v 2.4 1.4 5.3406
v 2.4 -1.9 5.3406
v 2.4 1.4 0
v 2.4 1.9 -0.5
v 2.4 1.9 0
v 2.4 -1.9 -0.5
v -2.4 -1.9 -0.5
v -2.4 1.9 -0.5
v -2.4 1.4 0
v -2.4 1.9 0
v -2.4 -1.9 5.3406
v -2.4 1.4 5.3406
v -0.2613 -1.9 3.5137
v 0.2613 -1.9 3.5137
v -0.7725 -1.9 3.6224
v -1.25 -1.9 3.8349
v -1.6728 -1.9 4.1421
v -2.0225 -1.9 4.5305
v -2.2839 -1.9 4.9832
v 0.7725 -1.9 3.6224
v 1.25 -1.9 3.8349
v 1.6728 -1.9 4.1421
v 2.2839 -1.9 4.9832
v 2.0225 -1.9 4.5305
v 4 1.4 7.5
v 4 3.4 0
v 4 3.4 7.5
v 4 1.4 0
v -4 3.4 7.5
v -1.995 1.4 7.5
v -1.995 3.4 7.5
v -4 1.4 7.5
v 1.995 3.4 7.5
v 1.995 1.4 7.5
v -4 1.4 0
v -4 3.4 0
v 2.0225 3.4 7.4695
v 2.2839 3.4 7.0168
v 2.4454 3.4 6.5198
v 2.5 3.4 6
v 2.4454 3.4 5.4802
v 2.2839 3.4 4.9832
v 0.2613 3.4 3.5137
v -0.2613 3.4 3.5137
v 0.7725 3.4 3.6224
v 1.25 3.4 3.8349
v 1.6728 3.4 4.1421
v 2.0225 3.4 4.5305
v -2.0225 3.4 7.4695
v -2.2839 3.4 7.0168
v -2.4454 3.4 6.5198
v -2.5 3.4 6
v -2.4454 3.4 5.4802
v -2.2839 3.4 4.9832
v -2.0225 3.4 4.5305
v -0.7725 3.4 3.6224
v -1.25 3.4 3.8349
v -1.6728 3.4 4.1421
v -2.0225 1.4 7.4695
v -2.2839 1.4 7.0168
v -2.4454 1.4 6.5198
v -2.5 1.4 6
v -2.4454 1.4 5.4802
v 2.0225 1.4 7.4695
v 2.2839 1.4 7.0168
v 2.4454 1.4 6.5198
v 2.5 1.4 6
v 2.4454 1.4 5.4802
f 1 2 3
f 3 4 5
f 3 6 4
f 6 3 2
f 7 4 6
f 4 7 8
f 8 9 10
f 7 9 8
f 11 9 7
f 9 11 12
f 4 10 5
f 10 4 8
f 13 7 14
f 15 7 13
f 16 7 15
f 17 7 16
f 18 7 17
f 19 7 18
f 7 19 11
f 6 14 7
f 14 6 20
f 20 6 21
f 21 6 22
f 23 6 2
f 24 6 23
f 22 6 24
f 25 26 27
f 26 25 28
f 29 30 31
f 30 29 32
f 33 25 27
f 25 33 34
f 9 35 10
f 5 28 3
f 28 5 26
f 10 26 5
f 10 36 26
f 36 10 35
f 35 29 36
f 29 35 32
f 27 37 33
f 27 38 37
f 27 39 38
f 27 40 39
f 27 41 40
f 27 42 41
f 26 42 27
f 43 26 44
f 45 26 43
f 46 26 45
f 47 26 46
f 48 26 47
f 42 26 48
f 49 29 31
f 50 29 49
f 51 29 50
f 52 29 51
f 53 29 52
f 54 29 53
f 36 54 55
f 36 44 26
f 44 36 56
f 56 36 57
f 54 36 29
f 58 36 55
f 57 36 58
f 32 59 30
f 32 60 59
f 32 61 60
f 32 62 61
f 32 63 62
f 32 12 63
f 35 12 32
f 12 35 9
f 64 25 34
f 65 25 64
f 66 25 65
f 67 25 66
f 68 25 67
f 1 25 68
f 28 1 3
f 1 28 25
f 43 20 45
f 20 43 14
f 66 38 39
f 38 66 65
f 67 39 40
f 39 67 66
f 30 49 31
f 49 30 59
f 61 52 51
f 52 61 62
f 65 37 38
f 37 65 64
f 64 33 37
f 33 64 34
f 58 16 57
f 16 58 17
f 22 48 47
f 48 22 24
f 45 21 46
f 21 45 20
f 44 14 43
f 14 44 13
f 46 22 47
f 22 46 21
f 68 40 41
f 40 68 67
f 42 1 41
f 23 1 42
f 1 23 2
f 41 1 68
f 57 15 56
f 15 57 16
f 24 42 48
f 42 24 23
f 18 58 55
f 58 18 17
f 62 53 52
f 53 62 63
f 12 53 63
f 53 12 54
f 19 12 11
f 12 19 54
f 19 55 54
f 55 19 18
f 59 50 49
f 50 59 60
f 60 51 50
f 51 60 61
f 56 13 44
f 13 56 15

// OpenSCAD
difference () {
  union () {
    translate ([0.000, 0.000, 3.000]) {
      cube (size = [ 4.800, 3.800, 7.000], center = true);
    }
    translate ([0.000, 2.400, 0.000]) {
      translate ([0.000, 0.000, 3.750]) {
        cube (size = [ 8.000, 2.000, 7.500], center = true);
      }
    }
  }
  translate ([0.000, 0.000, 6.000]) {
    rotate (a = 90.000, v = [1.000, 0.000, 0.000]) {
      cylinder(h = 8.000, r1 = 2.500, r2 = 2.500, center = true, $fn = 30.000);
    }
  }
}
